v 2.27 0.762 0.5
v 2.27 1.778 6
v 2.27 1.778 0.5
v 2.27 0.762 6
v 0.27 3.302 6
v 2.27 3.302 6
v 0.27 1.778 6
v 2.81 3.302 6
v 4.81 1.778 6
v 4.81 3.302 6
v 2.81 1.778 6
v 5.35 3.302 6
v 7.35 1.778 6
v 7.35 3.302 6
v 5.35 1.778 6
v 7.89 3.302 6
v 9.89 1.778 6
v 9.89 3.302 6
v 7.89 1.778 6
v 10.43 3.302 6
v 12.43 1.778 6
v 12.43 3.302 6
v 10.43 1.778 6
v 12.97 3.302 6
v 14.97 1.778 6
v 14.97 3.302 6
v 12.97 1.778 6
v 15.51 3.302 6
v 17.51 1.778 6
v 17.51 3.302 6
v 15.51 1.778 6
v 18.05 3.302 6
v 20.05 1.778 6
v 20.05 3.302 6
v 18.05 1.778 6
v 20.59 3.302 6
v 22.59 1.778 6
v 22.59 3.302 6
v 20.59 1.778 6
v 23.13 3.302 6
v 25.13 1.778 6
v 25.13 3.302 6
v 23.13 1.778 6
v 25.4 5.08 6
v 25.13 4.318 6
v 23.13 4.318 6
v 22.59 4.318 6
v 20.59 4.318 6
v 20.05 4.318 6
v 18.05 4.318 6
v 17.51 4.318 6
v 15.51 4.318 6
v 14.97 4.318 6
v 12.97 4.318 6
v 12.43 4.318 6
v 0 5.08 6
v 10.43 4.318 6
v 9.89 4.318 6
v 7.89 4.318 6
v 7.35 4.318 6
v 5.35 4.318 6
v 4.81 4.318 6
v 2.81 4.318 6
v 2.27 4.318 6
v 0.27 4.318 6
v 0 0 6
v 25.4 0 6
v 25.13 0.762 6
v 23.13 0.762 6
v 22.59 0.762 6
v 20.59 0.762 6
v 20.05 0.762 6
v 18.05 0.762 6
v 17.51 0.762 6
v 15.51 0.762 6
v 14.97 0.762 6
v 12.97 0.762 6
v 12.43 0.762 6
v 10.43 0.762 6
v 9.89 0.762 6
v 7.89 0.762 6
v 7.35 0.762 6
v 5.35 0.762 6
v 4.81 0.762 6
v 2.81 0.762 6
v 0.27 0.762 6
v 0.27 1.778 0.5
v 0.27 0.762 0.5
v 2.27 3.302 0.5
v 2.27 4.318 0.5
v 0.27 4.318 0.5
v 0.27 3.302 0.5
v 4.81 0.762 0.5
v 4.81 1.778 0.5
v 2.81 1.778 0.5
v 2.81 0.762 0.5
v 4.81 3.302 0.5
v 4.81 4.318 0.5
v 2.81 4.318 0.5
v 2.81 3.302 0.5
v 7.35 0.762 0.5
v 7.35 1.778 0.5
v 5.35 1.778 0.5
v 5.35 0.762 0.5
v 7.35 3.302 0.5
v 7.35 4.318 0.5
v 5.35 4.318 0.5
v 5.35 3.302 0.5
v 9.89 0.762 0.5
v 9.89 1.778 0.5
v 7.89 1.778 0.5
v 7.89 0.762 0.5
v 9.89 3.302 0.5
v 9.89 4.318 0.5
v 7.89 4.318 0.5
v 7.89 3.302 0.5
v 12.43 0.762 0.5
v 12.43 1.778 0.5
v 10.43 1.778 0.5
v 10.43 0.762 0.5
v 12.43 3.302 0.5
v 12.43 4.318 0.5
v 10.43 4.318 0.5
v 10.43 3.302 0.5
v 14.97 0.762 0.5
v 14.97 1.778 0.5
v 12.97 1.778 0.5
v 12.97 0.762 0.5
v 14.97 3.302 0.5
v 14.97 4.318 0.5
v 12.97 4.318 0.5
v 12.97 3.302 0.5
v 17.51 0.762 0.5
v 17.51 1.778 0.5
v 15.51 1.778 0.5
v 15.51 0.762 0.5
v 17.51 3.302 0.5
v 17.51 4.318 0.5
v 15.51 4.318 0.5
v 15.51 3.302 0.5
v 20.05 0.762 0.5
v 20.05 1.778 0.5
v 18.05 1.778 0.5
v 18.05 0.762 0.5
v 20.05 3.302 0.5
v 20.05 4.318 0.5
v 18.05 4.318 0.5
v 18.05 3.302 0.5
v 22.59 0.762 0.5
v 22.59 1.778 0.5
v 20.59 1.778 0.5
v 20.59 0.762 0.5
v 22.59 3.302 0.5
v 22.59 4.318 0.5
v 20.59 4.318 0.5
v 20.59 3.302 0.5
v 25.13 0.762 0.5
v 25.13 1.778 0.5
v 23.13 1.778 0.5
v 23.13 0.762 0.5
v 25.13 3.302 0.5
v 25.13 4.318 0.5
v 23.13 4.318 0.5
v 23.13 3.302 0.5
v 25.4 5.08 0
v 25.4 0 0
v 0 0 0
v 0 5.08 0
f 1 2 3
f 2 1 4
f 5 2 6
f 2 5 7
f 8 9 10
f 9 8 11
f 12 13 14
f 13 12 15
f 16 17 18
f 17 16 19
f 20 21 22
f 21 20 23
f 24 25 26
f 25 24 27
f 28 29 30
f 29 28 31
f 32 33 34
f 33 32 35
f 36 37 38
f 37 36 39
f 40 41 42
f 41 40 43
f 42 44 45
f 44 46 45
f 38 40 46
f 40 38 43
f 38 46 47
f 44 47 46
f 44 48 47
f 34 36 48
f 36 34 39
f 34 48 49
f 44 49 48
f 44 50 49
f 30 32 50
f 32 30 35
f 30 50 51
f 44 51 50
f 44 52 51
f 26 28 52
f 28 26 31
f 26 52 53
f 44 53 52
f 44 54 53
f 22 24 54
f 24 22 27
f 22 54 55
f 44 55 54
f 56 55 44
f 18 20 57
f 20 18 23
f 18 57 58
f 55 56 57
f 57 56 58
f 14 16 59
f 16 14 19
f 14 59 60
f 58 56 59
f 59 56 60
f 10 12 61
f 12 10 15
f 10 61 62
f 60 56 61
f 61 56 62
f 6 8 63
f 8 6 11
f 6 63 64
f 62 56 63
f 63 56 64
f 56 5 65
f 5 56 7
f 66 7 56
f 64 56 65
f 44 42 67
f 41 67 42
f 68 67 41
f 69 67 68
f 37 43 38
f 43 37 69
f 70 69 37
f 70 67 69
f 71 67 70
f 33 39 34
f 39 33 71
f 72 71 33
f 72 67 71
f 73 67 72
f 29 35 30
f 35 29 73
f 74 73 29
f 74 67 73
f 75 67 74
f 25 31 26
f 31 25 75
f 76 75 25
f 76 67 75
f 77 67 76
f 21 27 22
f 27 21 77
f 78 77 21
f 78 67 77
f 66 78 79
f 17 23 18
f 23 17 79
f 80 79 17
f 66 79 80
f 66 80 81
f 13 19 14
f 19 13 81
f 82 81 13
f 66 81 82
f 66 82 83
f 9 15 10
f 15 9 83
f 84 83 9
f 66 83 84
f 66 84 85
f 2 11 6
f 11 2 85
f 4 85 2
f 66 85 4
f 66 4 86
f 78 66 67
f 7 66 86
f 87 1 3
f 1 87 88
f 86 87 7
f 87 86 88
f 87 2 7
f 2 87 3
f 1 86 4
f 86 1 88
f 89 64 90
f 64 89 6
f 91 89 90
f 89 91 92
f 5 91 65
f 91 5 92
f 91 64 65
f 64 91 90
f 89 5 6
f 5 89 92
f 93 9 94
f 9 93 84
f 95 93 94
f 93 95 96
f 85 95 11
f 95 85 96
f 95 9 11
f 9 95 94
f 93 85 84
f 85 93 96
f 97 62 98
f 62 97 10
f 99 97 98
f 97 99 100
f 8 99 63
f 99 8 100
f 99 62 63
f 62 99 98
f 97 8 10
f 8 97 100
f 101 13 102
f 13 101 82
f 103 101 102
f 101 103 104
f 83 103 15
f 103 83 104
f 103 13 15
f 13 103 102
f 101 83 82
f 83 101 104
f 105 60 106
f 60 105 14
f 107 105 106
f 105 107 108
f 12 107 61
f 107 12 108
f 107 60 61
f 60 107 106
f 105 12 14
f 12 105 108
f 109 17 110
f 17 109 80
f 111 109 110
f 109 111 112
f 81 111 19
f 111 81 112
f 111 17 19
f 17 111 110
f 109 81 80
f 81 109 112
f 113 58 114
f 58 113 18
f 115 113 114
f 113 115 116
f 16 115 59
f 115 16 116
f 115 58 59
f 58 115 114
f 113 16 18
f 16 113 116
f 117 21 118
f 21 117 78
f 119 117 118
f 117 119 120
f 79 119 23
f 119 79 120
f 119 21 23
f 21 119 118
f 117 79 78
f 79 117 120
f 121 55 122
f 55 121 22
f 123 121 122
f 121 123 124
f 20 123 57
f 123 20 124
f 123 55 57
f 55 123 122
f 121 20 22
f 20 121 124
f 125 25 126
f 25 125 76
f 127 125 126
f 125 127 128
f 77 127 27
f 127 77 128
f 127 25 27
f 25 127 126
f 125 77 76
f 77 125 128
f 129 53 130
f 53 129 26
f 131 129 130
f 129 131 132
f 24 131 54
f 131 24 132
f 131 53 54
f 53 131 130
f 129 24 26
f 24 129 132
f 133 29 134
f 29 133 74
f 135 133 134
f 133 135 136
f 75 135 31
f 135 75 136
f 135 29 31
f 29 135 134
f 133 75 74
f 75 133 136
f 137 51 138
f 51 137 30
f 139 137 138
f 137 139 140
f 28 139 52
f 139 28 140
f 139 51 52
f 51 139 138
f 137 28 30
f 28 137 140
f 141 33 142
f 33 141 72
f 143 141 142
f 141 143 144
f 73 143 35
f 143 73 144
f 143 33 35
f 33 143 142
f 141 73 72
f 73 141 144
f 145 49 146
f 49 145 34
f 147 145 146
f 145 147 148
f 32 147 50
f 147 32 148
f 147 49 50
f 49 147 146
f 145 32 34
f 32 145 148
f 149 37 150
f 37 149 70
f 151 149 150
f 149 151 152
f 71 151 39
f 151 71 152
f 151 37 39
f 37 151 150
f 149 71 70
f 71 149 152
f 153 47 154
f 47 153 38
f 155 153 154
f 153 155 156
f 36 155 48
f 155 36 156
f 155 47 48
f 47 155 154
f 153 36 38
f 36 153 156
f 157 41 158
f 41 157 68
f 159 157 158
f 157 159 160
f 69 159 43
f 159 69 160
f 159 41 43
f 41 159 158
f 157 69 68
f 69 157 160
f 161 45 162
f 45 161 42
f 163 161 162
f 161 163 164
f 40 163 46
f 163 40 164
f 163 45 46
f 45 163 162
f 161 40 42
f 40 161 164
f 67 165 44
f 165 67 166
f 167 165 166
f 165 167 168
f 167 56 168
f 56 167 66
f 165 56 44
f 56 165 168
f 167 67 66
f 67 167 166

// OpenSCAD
difference() {
  translate([12.7000000000, 2.5400000000, 3.0000000000]) {
    scale([25.4000000000, 5.0800000000, 6.0000000000]) {
      translate([-0.5000000000, -0.5000000000, -0.5000000000]) {
        cube([1, 1, 1]);
      }
    }
  }
  union() {
    union() {
      union() {
        union() {
          union() {
            union() {
              union() {
                union() {
                  union() {
                    union() {
                      union() {
                        union() {
                          union() {
                            union() {
                              union() {
                                union() {
                                  union() {
                                    union() {
                                      union() {
                                        translate([1.2700000000, 1.2699995000, 3.2500000000]) {
                                          scale([2.0000000000, 1.0160000000, 5.5000000000]) {
                                            translate([-0.5000000000, -0.5000000000, -0.5000000000]) {
                                              cube([1, 1, 1]);
                                            }
                                          }
                                        }
                                        translate([1.2700000000, 3.8100000000, 3.2500000000]) {
                                          scale([2.0000000000, 1.0160000000, 5.5000000000]) {
                                            translate([-0.5000000000, -0.5000000000, -0.5000000000]) {
                                              cube([1, 1, 1]);
                                            }
                                          }
                                        }
                                      }
                                      translate([3.8100000000, 1.2699995000, 3.2500000000]) {
                                        scale([2.0000000000, 1.0160000000, 5.5000000000]) {
                                          translate([-0.5000000000, -0.5000000000, -0.5000000000]) {
                                            cube([1, 1, 1]);
                                          }
                                        }
                                      }
                                    }
                                    translate([3.8100000000, 3.8100000000, 3.2500000000]) {
                                      scale([2.0000000000, 1.0160000000, 5.5000000000]) {
                                        translate([-0.5000000000, -0.5000000000, -0.5000000000]) {
                                          cube([1, 1, 1]);
                                        }
                                      }
                                    }
                                  }
                                  translate([6.3500000000, 1.2699995000, 3.2500000000]) {
                                    scale([2.0000000000, 1.0160000000, 5.5000000000]) {
                                      translate([-0.5000000000, -0.5000000000, -0.5000000000]) {
                                        cube([1, 1, 1]);
                                      }
                                    }
                                  }
                                }
                                translate([6.3500000000, 3.8100000000, 3.2500000000]) {
                                  scale([2.0000000000, 1.0160000000, 5.5000000000]) {
                                    translate([-0.5000000000, -0.5000000000, -0.5000000000]) {
                                      cube([1, 1, 1]);
                                    }
                                  }
                                }
                              }
                              translate([8.8900000000, 1.2699995000, 3.2500000000]) {
                                scale([2.0000000000, 1.0160000000, 5.5000000000]) {
                                  translate([-0.5000000000, -0.5000000000, -0.5000000000]) {
                                    cube([1, 1, 1]);
                                  }
                                }
                              }
                            }
                            translate([8.8900000000, 3.8100000000, 3.2500000000]) {
                              scale([2.0000000000, 1.0160000000, 5.5000000000]) {
                                translate([-0.5000000000, -0.5000000000, -0.5000000000]) {
                                  cube([1, 1, 1]);
                                }
                              }
                            }
                          }
                          translate([11.4300000000, 1.2699995000, 3.2500000000]) {
                            scale([2.0000000000, 1.0160000000, 5.5000000000]) {
                              translate([-0.5000000000, -0.5000000000, -0.5000000000]) {
                                cube([1, 1, 1]);
                              }
                            }
                          }
                        }
                        translate([11.4300000000, 3.8100000000, 3.2500000000]) {
                          scale([2.0000000000, 1.0160000000, 5.5000000000]) {
                            translate([-0.5000000000, -0.5000000000, -0.5000000000]) {
                              cube([1, 1, 1]);
                            }
                          }
                        }
                      }
                      translate([13.9700000000, 1.2699995000, 3.2500000000]) {
                        scale([2.0000000000, 1.0160000000, 5.5000000000]) {
                          translate([-0.5000000000, -0.5000000000, -0.5000000000]) {
                            cube([1, 1, 1]);
                          }
                        }
                      }
                    }
                    translate([13.9700000000, 3.8100000000, 3.2500000000]) {
                      scale([2.0000000000, 1.0160000000, 5.5000000000]) {
                        translate([-0.5000000000, -0.5000000000, -0.5000000000]) {
                          cube([1, 1, 1]);
                        }
                      }
                    }
                  }
                  translate([16.5100000000, 1.2699995000, 3.2500000000]) {
                    scale([2.0000000000, 1.0160000000, 5.5000000000]) {
                      translate([-0.5000000000, -0.5000000000, -0.5000000000]) {
                        cube([1, 1, 1]);
                      }
                    }
                  }
                }
                translate([16.5100000000, 3.8100000000, 3.2500000000]) {
                  scale([2.0000000000, 1.0160000000, 5.5000000000]) {
                    translate([-0.5000000000, -0.5000000000, -0.5000000000]) {
                      cube([1, 1, 1]);
                    }
                  }
                }
              }
              translate([19.0500000000, 1.2699995000, 3.2500000000]) {
                scale([2.0000000000, 1.0160000000, 5.5000000000]) {
                  translate([-0.5000000000, -0.5000000000, -0.5000000000]) {
                    cube([1, 1, 1]);
                  }
                }
              }
            }
            translate([19.0500000000, 3.8100000000, 3.2500000000]) {
              scale([2.0000000000, 1.0160000000, 5.5000000000]) {
                translate([-0.5000000000, -0.5000000000, -0.5000000000]) {
                  cube([1, 1, 1]);
                }
              }
            }
          }
          translate([21.5900000000, 1.2699995000, 3.2500000000]) {
            scale([2.0000000000, 1.0160000000, 5.5000000000]) {
              translate([-0.5000000000, -0.5000000000, -0.5000000000]) {
                cube([1, 1, 1]);
              }
            }
          }
        }
        translate([21.5900000000, 3.8100000000, 3.2500000000]) {
          scale([2.0000000000, 1.0160000000, 5.5000000000]) {
            translate([-0.5000000000, -0.5000000000, -0.5000000000]) {
              cube([1, 1, 1]);
            }
          }
        }
      }
      translate([24.1300000000, 1.2699995000, 3.2500000000]) {
        scale([2.0000000000, 1.0160000000, 5.5000000000]) {
          translate([-0.5000000000, -0.5000000000, -0.5000000000]) {
            cube([1, 1, 1]);
          }
        }
      }
    }
    translate([24.1300000000, 3.8100000000, 3.2500000000]) {
      scale([2.0000000000, 1.0160000000, 5.5000000000]) {
        translate([-0.5000000000, -0.5000000000, -0.5000000000]) {
          cube([1, 1, 1]);
        }
      }
    }
  }
}
